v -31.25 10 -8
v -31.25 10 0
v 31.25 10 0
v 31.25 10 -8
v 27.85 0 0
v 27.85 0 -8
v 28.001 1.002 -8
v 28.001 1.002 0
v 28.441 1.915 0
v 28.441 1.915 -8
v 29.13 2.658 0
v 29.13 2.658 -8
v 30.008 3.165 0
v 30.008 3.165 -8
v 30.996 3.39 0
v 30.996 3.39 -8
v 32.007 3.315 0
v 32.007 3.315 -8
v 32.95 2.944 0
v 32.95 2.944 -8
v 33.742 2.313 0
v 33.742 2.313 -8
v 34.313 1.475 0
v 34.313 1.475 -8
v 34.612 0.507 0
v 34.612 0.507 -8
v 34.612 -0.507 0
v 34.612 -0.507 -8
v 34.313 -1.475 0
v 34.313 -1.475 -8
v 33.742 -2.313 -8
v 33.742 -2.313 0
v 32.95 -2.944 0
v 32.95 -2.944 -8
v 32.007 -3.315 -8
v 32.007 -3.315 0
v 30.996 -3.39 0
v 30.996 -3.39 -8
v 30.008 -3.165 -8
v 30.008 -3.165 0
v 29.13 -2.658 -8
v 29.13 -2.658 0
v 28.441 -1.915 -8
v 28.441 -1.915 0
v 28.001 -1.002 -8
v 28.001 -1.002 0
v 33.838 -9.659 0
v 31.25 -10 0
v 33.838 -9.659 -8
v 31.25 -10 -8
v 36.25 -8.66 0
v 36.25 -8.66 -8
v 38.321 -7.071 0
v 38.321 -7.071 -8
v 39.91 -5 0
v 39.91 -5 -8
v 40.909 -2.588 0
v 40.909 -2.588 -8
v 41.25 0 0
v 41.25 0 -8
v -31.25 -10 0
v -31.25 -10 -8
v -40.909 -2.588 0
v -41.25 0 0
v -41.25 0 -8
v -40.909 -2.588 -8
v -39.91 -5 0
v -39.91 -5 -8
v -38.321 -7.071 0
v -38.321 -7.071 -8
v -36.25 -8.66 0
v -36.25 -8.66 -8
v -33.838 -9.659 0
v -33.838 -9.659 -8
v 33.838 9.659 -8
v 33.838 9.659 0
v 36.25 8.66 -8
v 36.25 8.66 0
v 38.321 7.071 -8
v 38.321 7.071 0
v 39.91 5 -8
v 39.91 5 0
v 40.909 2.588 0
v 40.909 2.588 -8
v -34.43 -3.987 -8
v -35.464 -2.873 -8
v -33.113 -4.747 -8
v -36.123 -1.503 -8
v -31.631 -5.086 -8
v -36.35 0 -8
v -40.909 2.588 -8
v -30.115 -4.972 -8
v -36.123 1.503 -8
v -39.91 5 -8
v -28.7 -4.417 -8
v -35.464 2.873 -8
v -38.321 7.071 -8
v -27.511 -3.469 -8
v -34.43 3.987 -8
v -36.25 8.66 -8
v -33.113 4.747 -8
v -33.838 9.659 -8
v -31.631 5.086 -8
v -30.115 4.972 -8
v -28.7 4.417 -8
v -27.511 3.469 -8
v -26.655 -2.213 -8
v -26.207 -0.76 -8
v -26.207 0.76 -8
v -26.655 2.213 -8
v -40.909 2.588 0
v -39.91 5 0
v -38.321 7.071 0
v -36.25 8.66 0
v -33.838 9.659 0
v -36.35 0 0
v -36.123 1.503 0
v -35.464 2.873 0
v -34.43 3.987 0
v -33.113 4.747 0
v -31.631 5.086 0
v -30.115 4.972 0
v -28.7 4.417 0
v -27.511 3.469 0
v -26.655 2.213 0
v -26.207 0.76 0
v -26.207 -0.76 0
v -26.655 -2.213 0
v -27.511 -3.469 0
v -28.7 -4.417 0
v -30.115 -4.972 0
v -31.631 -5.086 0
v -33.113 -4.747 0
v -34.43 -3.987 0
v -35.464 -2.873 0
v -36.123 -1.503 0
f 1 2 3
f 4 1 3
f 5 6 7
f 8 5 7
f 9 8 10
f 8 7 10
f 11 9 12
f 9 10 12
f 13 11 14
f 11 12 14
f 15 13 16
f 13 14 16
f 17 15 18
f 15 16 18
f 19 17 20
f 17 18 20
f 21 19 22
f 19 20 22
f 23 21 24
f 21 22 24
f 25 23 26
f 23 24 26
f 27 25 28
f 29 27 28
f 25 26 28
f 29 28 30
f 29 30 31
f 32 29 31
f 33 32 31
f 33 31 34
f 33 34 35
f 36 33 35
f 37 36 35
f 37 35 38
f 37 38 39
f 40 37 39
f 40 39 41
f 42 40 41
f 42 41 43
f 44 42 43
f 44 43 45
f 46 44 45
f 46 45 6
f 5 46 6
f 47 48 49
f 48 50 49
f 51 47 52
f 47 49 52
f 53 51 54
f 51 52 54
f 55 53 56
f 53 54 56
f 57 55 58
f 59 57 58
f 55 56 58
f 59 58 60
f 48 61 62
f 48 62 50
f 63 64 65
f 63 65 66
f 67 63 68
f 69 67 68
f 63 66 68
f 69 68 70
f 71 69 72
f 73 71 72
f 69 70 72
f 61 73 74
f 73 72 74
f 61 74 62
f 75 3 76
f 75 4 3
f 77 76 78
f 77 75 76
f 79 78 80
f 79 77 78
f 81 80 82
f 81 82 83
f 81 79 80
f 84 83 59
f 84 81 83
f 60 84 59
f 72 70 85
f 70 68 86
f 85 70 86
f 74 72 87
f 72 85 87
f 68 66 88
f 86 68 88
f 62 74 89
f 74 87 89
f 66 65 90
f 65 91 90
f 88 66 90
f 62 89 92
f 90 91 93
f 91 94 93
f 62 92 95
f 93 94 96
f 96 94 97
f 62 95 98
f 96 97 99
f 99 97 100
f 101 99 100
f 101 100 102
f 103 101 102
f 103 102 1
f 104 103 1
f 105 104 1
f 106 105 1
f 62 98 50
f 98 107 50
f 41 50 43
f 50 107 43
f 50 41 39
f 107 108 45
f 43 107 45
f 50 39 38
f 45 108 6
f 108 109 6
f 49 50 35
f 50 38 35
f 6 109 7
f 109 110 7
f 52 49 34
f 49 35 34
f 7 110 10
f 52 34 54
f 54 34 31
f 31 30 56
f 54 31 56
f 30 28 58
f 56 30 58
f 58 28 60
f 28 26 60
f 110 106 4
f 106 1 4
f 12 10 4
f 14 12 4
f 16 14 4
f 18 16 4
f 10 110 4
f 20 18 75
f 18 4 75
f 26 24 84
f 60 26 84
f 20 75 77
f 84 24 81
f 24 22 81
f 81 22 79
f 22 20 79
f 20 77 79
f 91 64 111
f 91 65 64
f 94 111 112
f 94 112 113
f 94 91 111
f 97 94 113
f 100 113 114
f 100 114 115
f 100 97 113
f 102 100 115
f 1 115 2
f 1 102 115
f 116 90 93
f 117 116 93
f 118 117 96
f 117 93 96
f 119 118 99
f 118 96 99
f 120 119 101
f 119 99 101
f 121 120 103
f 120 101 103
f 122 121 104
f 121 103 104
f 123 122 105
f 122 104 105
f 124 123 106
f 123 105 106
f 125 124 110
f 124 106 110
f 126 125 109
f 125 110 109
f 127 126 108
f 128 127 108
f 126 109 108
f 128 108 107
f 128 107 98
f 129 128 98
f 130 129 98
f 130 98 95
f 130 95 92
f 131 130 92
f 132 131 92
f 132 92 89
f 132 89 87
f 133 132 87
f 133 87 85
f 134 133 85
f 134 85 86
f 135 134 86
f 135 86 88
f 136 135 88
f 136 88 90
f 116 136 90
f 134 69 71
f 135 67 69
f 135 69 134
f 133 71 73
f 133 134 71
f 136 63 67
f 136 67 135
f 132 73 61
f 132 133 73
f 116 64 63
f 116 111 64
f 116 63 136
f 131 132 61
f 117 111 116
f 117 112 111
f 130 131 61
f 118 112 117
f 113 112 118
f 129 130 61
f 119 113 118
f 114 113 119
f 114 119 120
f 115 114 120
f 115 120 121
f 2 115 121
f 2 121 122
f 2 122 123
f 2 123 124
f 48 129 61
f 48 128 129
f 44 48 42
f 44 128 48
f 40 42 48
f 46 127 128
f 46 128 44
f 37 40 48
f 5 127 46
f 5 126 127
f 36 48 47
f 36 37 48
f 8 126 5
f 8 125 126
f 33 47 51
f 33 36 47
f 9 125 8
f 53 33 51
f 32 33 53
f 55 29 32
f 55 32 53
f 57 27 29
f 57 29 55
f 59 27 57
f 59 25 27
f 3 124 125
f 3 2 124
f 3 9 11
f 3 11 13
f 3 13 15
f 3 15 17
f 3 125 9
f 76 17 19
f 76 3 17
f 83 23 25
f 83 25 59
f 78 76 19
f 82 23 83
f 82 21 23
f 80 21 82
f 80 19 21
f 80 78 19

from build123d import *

# Parameters (mm, degrees)
F0_W     = 82.5
F0_H     = 20
F1_DEPTH = 8
F2_D     = 10.2
F3_D     = 6.8
F4_R     = 9.99999


# Not quite as in the source:
# - a fillet or chamfer is up to 0.001 mm smaller than in the source, because OpenCascade refuses the exact size


with BuildPart() as f1:
    # F0 (on Top) → F1 (new body)
    with BuildSketch(Plane.XY):
        Rectangle(F0_W, F0_H)
    extrude(amount=-F1_DEPTH)

    # F2 (through all)
    with Locations(Plane.XY):
        with Locations((-31.25, 0)):
            Hole(F2_D / 2)

    # F3 (through all)
    with Locations(Plane.XY):
        with Locations((31.25, 0)):
            Hole(F3_D / 2)

    # F4 (radius 10 in the source; OpenCascade refuses exactly that, so slightly less here)
    f4_edges = [f1.edges().sort_by_distance(p)[0] for p in [
        (41.25, 10, -4),
        (41.25, -10, -4),
        (-41.25, 10, -4),
        (-41.25, -10, -4),
    ]]
    fillet(f4_edges, radius=F4_R)


solid = f1.part
